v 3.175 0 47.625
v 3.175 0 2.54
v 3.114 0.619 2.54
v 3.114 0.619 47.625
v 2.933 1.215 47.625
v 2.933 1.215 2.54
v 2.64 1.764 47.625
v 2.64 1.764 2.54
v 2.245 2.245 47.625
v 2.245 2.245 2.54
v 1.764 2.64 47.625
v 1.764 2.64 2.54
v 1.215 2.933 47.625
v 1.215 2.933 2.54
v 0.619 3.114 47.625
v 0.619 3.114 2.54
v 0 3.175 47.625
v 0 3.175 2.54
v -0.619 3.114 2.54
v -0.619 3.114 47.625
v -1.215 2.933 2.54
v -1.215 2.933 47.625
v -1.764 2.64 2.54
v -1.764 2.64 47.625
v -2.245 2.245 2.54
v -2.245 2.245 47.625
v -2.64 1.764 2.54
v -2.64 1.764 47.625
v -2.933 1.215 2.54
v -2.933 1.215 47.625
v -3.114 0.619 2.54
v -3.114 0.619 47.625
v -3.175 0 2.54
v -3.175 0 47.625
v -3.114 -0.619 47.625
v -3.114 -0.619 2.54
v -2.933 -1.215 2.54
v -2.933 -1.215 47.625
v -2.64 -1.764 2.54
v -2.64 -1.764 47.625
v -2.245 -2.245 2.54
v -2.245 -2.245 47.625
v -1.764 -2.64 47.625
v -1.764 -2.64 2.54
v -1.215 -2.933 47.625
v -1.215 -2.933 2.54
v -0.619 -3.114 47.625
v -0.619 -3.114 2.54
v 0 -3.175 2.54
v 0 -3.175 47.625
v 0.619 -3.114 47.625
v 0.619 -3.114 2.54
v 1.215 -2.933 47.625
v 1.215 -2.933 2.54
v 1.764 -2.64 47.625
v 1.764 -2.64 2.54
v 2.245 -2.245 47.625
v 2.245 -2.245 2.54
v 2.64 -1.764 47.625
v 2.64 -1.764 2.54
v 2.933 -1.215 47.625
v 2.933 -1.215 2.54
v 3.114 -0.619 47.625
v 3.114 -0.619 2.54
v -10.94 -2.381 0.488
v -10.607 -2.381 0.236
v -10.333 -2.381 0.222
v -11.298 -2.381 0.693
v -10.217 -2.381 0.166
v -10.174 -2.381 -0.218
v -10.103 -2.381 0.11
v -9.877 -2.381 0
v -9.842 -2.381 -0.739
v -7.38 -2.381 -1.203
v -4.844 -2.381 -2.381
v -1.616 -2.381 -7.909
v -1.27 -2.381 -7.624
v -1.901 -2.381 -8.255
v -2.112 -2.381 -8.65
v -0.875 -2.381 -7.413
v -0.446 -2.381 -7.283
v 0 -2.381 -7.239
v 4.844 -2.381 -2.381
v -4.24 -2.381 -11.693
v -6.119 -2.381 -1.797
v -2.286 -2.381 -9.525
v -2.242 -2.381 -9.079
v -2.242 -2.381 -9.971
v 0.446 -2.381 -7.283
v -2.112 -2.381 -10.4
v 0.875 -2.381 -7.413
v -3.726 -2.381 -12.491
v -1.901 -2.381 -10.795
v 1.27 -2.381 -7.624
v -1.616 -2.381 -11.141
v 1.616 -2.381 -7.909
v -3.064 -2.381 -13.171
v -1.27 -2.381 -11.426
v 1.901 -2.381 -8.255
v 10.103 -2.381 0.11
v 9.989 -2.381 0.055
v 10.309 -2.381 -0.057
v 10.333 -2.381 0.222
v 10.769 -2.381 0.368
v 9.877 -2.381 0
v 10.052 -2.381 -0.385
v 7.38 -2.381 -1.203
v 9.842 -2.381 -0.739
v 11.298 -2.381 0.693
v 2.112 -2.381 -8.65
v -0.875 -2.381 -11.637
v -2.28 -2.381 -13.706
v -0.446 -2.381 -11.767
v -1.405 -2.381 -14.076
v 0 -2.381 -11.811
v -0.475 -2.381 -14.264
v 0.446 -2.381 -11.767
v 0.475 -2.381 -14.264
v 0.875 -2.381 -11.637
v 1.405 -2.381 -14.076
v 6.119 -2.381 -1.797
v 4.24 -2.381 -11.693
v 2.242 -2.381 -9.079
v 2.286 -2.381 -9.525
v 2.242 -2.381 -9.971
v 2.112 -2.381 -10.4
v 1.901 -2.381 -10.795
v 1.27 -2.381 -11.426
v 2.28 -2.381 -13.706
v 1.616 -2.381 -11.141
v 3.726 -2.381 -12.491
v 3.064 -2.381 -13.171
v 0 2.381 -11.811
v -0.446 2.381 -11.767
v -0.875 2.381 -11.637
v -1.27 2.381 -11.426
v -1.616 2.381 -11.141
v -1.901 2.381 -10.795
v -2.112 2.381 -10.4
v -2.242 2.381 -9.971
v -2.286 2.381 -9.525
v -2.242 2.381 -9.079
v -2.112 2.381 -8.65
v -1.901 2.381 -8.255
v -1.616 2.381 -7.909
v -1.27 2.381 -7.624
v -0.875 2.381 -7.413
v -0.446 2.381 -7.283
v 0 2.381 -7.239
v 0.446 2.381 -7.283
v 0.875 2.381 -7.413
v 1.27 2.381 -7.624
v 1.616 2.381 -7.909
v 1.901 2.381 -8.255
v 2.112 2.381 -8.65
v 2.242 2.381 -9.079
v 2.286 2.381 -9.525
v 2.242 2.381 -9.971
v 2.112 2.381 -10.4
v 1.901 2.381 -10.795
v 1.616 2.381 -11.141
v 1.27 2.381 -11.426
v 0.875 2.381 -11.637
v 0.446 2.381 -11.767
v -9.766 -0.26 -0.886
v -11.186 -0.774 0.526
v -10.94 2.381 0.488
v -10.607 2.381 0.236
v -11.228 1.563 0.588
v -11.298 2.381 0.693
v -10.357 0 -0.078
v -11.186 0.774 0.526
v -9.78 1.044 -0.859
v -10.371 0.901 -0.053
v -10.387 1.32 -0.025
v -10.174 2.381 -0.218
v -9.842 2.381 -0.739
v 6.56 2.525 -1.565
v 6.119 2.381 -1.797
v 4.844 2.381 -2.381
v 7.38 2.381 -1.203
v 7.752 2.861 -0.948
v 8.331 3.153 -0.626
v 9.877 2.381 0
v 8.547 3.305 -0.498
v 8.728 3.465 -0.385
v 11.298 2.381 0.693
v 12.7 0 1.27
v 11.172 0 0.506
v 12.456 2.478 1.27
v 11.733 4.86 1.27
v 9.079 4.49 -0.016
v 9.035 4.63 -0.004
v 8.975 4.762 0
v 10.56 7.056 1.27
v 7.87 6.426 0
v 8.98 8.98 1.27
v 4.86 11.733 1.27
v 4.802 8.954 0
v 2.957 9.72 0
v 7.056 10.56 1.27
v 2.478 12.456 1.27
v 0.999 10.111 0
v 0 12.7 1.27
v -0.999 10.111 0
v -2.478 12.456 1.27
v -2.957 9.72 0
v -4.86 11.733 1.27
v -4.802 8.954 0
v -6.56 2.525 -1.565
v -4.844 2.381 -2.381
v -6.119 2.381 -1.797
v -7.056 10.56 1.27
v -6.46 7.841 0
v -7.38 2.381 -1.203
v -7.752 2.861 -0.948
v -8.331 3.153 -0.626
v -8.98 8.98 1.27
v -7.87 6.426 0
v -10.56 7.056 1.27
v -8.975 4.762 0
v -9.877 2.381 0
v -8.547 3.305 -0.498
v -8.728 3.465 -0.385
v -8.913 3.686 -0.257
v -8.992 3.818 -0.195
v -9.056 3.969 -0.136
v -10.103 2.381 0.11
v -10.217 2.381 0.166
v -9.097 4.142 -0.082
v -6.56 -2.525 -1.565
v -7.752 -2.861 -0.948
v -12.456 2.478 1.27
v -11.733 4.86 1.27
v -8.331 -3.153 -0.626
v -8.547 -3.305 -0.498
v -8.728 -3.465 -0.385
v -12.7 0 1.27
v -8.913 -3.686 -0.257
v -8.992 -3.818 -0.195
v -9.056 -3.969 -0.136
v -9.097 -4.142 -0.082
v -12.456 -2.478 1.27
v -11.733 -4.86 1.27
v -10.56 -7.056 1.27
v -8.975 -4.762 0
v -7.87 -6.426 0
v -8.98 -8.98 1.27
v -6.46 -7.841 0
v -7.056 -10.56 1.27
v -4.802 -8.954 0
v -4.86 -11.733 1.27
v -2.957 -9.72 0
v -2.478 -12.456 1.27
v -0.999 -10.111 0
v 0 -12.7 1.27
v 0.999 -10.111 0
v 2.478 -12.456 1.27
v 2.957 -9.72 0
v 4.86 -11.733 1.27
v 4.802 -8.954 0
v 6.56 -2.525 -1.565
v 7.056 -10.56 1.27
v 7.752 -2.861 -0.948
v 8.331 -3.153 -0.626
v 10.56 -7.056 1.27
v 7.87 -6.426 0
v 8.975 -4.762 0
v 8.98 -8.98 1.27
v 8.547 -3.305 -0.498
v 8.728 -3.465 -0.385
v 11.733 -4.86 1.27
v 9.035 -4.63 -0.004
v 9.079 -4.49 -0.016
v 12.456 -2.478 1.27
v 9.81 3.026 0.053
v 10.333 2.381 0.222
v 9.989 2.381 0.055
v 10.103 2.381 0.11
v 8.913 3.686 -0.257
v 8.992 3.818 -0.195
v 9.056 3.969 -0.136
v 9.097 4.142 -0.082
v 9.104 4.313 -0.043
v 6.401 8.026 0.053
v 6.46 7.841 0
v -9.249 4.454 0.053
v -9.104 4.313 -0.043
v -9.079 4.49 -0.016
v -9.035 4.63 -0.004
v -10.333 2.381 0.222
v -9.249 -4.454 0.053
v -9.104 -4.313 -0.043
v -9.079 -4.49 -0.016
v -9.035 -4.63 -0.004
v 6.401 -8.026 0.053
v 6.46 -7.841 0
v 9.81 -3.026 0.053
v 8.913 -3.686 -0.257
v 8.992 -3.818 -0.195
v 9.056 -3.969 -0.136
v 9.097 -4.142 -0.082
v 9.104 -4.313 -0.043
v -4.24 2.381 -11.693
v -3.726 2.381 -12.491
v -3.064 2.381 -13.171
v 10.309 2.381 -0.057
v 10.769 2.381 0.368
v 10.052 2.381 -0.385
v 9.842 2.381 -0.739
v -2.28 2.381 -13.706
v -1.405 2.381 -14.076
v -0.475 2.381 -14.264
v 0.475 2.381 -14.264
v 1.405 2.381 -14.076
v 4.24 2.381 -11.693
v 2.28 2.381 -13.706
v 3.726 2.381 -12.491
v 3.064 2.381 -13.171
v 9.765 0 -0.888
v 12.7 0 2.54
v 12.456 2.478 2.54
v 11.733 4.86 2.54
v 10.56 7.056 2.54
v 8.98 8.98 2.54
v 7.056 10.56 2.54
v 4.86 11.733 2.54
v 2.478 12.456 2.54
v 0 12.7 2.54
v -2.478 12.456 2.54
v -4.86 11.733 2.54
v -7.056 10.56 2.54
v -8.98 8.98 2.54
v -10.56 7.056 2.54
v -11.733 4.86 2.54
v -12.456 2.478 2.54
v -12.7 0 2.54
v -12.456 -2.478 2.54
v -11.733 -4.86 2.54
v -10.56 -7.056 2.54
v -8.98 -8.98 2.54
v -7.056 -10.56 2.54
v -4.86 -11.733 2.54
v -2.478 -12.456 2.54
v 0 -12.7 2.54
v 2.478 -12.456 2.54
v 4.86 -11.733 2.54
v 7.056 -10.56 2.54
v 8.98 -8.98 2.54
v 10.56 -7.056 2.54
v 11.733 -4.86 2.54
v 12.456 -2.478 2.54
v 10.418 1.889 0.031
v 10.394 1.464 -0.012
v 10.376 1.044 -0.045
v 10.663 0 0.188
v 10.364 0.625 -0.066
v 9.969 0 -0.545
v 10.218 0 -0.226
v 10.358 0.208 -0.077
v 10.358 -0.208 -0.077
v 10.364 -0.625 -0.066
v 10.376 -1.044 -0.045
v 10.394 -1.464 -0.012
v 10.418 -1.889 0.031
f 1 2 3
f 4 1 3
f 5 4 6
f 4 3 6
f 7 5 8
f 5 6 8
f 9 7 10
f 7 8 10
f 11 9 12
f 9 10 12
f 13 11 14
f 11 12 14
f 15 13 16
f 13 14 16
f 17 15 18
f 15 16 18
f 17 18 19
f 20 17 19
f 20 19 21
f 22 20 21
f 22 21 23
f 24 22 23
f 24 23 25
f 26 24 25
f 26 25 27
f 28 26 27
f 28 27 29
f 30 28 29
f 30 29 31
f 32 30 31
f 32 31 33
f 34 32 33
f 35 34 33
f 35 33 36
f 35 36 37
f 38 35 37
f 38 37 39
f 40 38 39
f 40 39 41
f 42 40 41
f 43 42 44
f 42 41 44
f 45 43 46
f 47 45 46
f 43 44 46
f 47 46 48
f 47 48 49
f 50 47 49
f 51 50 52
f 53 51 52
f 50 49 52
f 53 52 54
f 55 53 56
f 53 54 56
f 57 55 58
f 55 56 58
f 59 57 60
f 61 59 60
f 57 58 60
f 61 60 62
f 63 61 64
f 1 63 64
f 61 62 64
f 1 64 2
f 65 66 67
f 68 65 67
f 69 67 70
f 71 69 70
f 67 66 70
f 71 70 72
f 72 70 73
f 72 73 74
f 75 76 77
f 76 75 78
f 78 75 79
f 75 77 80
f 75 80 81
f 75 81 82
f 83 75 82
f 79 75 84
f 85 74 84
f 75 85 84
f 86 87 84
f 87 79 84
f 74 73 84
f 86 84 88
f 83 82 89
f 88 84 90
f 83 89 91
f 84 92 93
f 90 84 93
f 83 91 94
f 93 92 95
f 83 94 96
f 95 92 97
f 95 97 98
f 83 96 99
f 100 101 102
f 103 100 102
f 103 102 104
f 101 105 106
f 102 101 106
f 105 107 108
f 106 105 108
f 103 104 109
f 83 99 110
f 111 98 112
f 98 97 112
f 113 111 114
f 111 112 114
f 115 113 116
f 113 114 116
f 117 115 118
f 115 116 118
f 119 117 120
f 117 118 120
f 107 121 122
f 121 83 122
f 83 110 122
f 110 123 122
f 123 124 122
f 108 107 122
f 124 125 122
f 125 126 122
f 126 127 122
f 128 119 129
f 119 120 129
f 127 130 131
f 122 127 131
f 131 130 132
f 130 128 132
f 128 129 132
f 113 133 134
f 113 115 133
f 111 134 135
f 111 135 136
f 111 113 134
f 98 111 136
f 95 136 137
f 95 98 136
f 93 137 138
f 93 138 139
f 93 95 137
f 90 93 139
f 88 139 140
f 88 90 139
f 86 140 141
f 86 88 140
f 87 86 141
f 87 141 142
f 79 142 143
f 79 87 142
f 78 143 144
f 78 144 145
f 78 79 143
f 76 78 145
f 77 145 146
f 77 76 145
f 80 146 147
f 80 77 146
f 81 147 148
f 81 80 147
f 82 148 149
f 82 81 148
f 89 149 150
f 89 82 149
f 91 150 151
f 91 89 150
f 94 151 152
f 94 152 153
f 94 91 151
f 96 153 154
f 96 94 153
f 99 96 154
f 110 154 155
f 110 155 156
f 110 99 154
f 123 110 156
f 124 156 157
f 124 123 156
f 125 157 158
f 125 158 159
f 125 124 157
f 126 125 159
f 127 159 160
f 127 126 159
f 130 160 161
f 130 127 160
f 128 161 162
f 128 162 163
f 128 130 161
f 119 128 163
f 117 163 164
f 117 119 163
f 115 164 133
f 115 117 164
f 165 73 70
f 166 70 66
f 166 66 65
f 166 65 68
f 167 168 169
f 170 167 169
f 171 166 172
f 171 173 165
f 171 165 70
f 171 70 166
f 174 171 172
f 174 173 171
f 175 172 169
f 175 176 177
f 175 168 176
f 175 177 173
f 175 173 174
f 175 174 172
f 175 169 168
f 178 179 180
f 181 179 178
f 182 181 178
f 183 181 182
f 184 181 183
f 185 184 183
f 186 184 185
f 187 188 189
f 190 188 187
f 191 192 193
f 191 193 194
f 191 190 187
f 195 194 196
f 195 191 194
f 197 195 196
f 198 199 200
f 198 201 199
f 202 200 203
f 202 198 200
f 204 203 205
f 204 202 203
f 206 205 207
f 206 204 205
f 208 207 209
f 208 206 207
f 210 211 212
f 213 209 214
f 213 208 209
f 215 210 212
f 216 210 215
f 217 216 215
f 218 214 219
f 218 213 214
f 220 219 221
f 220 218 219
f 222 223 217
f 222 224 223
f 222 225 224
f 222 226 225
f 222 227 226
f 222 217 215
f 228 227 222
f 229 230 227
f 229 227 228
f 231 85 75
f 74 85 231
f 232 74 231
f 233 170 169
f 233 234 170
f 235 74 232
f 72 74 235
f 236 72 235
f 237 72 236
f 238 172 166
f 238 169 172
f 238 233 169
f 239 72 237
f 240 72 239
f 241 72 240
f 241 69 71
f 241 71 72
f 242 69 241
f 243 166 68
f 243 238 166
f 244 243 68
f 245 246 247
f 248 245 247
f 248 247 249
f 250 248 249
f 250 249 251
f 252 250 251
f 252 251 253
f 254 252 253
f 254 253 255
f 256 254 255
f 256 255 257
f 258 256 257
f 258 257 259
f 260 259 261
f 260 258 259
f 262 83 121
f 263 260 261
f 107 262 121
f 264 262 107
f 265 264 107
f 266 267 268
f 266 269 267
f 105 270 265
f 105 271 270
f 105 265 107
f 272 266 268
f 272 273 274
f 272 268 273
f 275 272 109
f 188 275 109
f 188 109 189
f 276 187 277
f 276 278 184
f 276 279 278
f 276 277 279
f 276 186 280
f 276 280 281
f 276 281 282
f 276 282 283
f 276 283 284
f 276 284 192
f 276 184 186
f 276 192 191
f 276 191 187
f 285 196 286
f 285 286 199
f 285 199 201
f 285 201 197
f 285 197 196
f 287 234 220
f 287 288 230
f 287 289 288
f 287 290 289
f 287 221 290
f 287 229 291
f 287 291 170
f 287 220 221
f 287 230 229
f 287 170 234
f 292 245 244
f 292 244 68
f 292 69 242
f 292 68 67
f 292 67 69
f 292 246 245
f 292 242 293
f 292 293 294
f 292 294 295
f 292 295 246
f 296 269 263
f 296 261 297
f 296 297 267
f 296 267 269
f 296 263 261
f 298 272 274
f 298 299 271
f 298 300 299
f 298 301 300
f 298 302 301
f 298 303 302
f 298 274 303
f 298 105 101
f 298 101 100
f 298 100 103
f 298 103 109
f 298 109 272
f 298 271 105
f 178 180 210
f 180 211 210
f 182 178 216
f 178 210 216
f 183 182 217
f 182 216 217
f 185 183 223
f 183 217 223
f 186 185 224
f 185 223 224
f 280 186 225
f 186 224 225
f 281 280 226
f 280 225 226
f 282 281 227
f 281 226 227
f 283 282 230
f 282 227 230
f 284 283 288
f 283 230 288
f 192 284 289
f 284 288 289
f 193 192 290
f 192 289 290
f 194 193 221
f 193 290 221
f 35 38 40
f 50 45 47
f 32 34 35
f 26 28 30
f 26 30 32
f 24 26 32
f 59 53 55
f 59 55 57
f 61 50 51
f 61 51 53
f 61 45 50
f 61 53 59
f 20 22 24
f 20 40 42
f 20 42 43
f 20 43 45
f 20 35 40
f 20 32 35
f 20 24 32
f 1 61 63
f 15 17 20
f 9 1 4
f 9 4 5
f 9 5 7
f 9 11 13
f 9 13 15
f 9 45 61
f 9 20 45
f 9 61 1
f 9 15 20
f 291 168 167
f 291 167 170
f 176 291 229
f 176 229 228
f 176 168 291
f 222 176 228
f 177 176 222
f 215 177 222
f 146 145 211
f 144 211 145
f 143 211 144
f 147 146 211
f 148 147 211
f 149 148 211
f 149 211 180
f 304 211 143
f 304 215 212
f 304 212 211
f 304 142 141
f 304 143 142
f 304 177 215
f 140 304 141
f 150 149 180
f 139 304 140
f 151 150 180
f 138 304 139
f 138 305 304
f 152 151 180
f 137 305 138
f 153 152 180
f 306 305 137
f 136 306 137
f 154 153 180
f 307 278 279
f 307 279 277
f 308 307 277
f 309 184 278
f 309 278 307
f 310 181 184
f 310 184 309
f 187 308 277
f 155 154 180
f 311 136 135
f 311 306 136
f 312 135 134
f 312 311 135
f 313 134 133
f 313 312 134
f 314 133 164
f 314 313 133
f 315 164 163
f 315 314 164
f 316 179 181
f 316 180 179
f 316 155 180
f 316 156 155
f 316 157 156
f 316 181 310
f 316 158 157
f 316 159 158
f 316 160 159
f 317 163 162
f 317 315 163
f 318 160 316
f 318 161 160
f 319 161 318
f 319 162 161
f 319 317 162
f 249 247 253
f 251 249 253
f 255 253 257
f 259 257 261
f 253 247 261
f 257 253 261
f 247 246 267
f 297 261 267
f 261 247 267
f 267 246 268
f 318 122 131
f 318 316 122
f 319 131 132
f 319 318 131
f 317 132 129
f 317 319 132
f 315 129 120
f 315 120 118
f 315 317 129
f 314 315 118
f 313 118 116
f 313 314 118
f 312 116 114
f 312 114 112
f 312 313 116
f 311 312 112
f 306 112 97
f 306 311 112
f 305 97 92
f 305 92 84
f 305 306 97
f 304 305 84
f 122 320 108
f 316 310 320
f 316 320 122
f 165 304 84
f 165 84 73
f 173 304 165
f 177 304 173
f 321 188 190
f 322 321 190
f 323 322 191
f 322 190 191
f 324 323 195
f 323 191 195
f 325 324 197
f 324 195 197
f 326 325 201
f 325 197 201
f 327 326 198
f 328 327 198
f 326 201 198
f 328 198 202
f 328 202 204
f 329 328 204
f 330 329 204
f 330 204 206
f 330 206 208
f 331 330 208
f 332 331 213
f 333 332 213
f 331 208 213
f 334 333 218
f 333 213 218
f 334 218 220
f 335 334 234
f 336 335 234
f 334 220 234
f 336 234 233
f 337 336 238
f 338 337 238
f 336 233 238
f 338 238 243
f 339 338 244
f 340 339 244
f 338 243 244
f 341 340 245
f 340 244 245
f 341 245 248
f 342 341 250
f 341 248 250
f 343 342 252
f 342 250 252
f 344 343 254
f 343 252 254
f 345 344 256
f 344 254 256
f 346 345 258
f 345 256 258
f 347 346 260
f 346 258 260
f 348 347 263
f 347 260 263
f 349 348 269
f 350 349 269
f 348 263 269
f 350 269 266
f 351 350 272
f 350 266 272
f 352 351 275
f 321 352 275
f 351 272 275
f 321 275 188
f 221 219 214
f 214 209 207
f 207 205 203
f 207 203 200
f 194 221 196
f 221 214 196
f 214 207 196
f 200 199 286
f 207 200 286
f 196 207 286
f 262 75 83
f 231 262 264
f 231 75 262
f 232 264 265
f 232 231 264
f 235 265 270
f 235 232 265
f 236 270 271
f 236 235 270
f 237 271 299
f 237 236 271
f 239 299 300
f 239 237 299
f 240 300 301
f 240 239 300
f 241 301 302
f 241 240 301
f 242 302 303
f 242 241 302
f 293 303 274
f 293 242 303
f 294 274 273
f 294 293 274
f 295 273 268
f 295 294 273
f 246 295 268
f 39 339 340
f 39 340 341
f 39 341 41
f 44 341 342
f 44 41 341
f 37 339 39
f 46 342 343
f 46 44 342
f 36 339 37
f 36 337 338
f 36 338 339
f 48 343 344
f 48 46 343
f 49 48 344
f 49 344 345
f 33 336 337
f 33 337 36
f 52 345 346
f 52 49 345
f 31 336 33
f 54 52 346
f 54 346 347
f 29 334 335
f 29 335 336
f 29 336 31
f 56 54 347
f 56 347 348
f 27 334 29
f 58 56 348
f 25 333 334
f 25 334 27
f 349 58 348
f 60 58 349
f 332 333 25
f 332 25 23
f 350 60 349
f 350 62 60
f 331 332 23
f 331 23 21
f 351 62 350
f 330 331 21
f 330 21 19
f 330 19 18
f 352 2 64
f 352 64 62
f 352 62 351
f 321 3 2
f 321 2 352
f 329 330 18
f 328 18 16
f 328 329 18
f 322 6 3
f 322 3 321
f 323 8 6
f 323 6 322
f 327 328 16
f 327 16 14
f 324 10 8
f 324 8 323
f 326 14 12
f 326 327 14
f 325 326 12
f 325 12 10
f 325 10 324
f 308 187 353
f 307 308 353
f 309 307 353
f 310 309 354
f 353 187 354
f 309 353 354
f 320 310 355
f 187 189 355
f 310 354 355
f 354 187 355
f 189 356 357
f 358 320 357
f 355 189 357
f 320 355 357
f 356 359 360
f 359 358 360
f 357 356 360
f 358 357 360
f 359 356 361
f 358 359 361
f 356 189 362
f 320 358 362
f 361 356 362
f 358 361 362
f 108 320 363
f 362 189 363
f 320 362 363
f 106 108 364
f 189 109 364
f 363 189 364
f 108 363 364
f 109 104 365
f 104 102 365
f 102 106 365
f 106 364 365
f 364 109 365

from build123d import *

# Parameters (mm, degrees)
SKETCH1_R           = 12.7
SKETCH1_R_2         = 11.1125
SKETCH1_R_3         = 3.175
BOSS_EXTRUDE1_DEPTH = 2.54
SKETCH1_3_R         = 3.175
BOSS_EXTRUDE2_DEPTH = 47.625
CHAMFER1_SIZE       = 2.54
CHAMFER1_SIZE2      = 1.27
SKETCH2_R           = 2.286
BOSS_EXTRUDE3_DEPTH = 2.38125
FILLET1_R           = 3.175
FILLET2_R           = 2.38125


with BuildPart() as part:
    # Sketch1 → Boss-Extrude1 (new body)
    # profile 1 of 3: a face of its own
    with BuildSketch(Plane.XY):
        Circle(SKETCH1_R)
        Circle(SKETCH1_R_2, mode=Mode.SUBTRACT)
    # profile 2 of 3: a face of its own
    with BuildSketch(Plane.XY):
        Circle(SKETCH1_R_2)
        Circle(SKETCH1_R_3, mode=Mode.SUBTRACT)
    # profile 3 of 3: a face of its own
    with BuildSketch(Plane.XY):
        Circle(SKETCH1_R_3)
    extrude(amount=BOSS_EXTRUDE1_DEPTH)

    # Sketch1<3> → Boss-Extrude2 (add)
    with BuildSketch(Plane.XY):
        Circle(SKETCH1_3_R)
    extrude(amount=BOSS_EXTRUDE2_DEPTH)

    # Chamfer1
    chamfer1_edges = [part.edges().sort_by_distance(p)[0] for p in [
        (-12.7, 0, 0),
    ]]
    chamfer1_side = [part.faces().sort_by_distance(p)[0] for p in [
        (0, 0, 0),
    ]]
    chamfer(chamfer1_edges, length=CHAMFER1_SIZE, length2=CHAMFER1_SIZE2, reference=chamfer1_side[0])

    # Sketch2 → Boss-Extrude3 (add, symmetric)
    with BuildSketch(Plane(origin=(0, 0, 0), x_dir=(1, 0, 0), z_dir=(0, 1, 0))):
        with BuildLine():
            Line((-4.240295204, 11.693248793), (-11.1125, -1.74625))
            Line((-11.1125, -1.74625), (11.1125, -1.74625))
            Line((11.1125, -1.74625), (4.240295204, 11.693248793))
            ThreePointArc((4.240295204, 11.693248793), (0, 14.2875), (-4.240295204, 11.693248793))
        make_face()
        with Locations(Location((0, 9.525, 0), (0, 0, 90))):
            Circle(SKETCH2_R, mode=Mode.SUBTRACT)
    extrude(amount=BOSS_EXTRUDE3_DEPTH, both=True)

    # Fillet1
    fillet1_edges = [part.edges().sort_by_distance(p)[0] for p in [
        (10.263836295, -1.194873852, 0.086576696),
        (-10.240026318, 0, 0.040013159),
        (10.263836295, 1.194873852, 0.086576696),
    ]]
    fillet(fillet1_edges, radius=FILLET1_R)

    # Fillet2
    fillet2_edges = [part.edges().sort_by_distance(p)[0] for p in [
        (0, 2.38125, 0),
        (0, -2.38125, 0),
    ]]
    fillet(fillet2_edges, radius=FILLET2_R)


solid = part.part
